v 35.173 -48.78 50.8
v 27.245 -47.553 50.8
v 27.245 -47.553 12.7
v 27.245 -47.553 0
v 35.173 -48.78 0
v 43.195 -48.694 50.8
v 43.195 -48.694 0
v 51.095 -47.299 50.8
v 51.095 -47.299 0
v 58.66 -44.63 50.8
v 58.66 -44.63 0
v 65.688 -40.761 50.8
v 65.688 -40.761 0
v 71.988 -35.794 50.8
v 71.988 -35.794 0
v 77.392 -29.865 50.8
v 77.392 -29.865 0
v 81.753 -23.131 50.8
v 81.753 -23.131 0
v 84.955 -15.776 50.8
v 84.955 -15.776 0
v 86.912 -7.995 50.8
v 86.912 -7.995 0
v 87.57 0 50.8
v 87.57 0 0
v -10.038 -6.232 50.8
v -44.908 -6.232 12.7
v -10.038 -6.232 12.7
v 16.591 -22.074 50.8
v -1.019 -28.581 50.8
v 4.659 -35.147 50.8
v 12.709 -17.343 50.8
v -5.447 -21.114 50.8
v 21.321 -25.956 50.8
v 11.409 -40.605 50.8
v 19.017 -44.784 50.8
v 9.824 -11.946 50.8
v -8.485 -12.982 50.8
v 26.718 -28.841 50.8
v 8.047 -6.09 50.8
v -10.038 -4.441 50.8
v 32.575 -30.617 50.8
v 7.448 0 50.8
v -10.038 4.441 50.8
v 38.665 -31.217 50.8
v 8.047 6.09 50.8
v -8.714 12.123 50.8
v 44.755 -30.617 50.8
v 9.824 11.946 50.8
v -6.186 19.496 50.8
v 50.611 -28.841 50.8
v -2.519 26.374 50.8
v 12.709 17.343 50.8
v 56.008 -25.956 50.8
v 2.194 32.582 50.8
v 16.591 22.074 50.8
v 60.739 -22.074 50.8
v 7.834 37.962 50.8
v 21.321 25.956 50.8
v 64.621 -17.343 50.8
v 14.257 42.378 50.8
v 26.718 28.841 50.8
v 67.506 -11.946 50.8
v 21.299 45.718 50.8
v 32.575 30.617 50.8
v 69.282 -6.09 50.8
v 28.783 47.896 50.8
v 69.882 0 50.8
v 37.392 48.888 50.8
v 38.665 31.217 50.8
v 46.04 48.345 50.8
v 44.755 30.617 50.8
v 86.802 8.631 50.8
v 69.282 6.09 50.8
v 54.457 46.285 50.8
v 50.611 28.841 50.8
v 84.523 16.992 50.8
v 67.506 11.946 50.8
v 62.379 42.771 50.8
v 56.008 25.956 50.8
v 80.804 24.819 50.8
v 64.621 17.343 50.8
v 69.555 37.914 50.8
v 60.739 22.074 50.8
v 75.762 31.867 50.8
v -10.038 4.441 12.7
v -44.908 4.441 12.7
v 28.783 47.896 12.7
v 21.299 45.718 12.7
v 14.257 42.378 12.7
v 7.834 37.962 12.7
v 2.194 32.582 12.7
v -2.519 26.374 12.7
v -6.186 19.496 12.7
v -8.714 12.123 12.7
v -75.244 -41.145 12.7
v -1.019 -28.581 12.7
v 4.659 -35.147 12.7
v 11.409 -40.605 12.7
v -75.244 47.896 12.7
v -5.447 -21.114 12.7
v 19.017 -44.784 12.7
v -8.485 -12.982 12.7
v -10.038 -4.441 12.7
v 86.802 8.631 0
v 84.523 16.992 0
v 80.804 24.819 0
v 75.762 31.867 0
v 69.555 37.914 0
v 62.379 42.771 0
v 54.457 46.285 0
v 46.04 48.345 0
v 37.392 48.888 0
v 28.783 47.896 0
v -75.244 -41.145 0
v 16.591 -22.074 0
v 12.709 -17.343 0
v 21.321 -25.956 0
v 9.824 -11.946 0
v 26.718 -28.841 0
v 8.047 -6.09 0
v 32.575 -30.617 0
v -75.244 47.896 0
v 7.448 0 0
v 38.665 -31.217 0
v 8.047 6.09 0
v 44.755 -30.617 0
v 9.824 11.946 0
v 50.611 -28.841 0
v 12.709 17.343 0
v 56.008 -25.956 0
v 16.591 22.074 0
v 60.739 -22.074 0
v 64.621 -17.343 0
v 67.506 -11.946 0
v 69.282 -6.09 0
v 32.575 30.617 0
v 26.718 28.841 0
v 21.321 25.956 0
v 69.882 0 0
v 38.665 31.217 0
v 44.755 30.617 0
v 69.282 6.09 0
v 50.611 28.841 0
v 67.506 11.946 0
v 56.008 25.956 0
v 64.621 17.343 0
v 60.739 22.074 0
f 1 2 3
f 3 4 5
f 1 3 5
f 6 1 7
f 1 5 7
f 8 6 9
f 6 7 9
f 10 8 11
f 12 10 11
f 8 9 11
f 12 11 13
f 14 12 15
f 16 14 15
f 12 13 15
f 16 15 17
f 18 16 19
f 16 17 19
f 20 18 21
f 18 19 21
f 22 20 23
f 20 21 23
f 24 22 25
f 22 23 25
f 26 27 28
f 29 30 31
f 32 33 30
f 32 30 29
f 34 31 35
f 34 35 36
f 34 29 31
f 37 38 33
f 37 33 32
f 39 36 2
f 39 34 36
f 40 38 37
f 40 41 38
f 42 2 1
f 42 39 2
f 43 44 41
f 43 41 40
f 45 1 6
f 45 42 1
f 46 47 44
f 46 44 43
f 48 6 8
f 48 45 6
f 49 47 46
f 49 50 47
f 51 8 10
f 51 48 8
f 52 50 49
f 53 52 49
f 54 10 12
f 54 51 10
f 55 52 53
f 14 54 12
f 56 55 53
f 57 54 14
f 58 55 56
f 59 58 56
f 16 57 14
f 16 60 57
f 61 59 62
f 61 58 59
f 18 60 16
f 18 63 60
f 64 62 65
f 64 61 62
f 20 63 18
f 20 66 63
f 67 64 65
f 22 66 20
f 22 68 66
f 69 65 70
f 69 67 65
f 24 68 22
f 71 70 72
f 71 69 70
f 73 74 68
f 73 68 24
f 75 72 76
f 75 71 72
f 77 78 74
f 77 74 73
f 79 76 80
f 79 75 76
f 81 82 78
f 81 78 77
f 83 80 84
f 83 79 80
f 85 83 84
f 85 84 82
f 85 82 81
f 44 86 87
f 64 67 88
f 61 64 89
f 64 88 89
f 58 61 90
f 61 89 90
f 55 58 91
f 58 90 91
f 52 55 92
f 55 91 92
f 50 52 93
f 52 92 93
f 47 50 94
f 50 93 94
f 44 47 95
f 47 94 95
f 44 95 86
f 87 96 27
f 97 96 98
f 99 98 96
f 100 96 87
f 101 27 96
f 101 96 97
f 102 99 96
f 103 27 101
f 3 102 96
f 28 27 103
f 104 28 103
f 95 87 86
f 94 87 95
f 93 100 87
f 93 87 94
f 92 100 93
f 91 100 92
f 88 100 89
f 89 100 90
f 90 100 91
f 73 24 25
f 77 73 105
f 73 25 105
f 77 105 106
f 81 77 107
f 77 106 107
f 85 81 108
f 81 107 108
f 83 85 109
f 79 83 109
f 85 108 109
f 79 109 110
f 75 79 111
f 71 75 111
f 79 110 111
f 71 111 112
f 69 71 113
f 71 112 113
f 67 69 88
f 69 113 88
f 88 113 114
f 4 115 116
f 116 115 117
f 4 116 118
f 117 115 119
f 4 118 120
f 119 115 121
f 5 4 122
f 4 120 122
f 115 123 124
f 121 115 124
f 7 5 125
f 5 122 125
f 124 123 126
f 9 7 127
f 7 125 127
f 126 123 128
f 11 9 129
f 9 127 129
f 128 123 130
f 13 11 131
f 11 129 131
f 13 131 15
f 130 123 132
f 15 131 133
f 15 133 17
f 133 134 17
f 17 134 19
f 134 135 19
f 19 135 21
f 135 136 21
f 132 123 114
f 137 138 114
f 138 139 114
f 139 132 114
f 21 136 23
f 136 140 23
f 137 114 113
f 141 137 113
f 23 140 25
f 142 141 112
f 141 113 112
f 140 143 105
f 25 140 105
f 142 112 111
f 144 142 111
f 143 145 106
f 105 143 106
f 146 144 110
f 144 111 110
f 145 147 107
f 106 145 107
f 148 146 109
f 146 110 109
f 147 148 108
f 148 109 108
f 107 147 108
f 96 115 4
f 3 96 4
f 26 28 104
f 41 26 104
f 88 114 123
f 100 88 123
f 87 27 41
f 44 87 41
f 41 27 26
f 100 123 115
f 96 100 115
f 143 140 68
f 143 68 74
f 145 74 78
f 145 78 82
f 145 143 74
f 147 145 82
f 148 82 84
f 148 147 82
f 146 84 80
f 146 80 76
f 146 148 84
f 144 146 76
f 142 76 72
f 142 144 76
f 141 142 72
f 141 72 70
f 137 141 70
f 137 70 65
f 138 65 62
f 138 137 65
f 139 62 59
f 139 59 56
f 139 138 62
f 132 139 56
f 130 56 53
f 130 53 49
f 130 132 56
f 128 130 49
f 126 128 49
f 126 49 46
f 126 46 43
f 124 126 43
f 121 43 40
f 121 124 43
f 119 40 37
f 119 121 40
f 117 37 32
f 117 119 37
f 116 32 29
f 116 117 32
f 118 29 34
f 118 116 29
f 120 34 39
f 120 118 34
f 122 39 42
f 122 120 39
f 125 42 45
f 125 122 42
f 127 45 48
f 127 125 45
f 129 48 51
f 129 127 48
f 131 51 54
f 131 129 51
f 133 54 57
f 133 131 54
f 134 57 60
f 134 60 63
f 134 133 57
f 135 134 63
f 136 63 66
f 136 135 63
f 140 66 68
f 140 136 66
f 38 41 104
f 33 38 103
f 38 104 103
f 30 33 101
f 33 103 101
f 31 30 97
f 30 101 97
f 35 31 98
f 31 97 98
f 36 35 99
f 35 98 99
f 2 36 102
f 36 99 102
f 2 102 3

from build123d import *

# Parameters (mm, degrees)
F0_R     = 31.217266
F1_DEPTH = 50.8
F2_DEPTH = 12.7
F4_DEPTH = 38.862
F6_DEPTH = 177.8


with BuildPart() as f1:
    # F0 (on Top) → F1 (new body)
    with BuildSketch(Plane.XY):
        with BuildLine():
            ThreePointArc((27.24497, -47.55269), (68.940098, -38.406733), (87.569511, 0))
            ThreePointArc((87.569511, 0), (69.555113, 37.913842), (28.783381, 47.896017))
            ThreePointArc((28.783381, 47.896017), (-10.233562, 0.788128), (27.24497, -47.55269))
        make_face()
        with Locations((38.664799, 0)):
            Circle(F0_R, mode=Mode.SUBTRACT)
    extrude(amount=F1_DEPTH)

    # F0 (on Top) → F2 (join)
    with BuildSketch(Plane.XY):
        with BuildLine():
            ThreePointArc((27.24497, -47.55269), (-10.233562, 0.788128), (28.783381, 47.896017))
            Line((28.783381, 47.896017), (-75.24436, 47.896017))
            Line((-75.24436, 47.896017), (-75.24436, -41.144535))
            Line((-75.24436, -41.144535), (27.24497, -47.55269))
        make_face()
    extrude(amount=F2_DEPTH)

    # F3 (on face) → F4 (join)
    with BuildSketch(Plane.XY.offset(50.8)):
        with BuildLine():
            ThreePointArc((-10.037816, -4.441411), (-10.239913, 0), (-10.037816, 4.441411))
            Line((-10.037816, 4.441411), (-44.907834, 4.441411))
            Line((-44.907834, 4.441411), (-44.907834, -6.231935))
            Line((-44.907834, -6.231935), (-10.037816, -6.231935))
            Line((-10.037816, -6.231935), (-10.037816, -4.441411))
        make_face()
    extrude(amount=-F4_DEPTH)

    # F5 (on face) → F6 (cut)
    with BuildSketch(Plane.XZ.offset(6.231935)):
        Polygon((-44.907834, 50.8), (-44.907834, 12.7), (-10.037816, 50.8), align=None)
    extrude(amount=-F6_DEPTH, mode=Mode.SUBTRACT)


solid = f1.part
